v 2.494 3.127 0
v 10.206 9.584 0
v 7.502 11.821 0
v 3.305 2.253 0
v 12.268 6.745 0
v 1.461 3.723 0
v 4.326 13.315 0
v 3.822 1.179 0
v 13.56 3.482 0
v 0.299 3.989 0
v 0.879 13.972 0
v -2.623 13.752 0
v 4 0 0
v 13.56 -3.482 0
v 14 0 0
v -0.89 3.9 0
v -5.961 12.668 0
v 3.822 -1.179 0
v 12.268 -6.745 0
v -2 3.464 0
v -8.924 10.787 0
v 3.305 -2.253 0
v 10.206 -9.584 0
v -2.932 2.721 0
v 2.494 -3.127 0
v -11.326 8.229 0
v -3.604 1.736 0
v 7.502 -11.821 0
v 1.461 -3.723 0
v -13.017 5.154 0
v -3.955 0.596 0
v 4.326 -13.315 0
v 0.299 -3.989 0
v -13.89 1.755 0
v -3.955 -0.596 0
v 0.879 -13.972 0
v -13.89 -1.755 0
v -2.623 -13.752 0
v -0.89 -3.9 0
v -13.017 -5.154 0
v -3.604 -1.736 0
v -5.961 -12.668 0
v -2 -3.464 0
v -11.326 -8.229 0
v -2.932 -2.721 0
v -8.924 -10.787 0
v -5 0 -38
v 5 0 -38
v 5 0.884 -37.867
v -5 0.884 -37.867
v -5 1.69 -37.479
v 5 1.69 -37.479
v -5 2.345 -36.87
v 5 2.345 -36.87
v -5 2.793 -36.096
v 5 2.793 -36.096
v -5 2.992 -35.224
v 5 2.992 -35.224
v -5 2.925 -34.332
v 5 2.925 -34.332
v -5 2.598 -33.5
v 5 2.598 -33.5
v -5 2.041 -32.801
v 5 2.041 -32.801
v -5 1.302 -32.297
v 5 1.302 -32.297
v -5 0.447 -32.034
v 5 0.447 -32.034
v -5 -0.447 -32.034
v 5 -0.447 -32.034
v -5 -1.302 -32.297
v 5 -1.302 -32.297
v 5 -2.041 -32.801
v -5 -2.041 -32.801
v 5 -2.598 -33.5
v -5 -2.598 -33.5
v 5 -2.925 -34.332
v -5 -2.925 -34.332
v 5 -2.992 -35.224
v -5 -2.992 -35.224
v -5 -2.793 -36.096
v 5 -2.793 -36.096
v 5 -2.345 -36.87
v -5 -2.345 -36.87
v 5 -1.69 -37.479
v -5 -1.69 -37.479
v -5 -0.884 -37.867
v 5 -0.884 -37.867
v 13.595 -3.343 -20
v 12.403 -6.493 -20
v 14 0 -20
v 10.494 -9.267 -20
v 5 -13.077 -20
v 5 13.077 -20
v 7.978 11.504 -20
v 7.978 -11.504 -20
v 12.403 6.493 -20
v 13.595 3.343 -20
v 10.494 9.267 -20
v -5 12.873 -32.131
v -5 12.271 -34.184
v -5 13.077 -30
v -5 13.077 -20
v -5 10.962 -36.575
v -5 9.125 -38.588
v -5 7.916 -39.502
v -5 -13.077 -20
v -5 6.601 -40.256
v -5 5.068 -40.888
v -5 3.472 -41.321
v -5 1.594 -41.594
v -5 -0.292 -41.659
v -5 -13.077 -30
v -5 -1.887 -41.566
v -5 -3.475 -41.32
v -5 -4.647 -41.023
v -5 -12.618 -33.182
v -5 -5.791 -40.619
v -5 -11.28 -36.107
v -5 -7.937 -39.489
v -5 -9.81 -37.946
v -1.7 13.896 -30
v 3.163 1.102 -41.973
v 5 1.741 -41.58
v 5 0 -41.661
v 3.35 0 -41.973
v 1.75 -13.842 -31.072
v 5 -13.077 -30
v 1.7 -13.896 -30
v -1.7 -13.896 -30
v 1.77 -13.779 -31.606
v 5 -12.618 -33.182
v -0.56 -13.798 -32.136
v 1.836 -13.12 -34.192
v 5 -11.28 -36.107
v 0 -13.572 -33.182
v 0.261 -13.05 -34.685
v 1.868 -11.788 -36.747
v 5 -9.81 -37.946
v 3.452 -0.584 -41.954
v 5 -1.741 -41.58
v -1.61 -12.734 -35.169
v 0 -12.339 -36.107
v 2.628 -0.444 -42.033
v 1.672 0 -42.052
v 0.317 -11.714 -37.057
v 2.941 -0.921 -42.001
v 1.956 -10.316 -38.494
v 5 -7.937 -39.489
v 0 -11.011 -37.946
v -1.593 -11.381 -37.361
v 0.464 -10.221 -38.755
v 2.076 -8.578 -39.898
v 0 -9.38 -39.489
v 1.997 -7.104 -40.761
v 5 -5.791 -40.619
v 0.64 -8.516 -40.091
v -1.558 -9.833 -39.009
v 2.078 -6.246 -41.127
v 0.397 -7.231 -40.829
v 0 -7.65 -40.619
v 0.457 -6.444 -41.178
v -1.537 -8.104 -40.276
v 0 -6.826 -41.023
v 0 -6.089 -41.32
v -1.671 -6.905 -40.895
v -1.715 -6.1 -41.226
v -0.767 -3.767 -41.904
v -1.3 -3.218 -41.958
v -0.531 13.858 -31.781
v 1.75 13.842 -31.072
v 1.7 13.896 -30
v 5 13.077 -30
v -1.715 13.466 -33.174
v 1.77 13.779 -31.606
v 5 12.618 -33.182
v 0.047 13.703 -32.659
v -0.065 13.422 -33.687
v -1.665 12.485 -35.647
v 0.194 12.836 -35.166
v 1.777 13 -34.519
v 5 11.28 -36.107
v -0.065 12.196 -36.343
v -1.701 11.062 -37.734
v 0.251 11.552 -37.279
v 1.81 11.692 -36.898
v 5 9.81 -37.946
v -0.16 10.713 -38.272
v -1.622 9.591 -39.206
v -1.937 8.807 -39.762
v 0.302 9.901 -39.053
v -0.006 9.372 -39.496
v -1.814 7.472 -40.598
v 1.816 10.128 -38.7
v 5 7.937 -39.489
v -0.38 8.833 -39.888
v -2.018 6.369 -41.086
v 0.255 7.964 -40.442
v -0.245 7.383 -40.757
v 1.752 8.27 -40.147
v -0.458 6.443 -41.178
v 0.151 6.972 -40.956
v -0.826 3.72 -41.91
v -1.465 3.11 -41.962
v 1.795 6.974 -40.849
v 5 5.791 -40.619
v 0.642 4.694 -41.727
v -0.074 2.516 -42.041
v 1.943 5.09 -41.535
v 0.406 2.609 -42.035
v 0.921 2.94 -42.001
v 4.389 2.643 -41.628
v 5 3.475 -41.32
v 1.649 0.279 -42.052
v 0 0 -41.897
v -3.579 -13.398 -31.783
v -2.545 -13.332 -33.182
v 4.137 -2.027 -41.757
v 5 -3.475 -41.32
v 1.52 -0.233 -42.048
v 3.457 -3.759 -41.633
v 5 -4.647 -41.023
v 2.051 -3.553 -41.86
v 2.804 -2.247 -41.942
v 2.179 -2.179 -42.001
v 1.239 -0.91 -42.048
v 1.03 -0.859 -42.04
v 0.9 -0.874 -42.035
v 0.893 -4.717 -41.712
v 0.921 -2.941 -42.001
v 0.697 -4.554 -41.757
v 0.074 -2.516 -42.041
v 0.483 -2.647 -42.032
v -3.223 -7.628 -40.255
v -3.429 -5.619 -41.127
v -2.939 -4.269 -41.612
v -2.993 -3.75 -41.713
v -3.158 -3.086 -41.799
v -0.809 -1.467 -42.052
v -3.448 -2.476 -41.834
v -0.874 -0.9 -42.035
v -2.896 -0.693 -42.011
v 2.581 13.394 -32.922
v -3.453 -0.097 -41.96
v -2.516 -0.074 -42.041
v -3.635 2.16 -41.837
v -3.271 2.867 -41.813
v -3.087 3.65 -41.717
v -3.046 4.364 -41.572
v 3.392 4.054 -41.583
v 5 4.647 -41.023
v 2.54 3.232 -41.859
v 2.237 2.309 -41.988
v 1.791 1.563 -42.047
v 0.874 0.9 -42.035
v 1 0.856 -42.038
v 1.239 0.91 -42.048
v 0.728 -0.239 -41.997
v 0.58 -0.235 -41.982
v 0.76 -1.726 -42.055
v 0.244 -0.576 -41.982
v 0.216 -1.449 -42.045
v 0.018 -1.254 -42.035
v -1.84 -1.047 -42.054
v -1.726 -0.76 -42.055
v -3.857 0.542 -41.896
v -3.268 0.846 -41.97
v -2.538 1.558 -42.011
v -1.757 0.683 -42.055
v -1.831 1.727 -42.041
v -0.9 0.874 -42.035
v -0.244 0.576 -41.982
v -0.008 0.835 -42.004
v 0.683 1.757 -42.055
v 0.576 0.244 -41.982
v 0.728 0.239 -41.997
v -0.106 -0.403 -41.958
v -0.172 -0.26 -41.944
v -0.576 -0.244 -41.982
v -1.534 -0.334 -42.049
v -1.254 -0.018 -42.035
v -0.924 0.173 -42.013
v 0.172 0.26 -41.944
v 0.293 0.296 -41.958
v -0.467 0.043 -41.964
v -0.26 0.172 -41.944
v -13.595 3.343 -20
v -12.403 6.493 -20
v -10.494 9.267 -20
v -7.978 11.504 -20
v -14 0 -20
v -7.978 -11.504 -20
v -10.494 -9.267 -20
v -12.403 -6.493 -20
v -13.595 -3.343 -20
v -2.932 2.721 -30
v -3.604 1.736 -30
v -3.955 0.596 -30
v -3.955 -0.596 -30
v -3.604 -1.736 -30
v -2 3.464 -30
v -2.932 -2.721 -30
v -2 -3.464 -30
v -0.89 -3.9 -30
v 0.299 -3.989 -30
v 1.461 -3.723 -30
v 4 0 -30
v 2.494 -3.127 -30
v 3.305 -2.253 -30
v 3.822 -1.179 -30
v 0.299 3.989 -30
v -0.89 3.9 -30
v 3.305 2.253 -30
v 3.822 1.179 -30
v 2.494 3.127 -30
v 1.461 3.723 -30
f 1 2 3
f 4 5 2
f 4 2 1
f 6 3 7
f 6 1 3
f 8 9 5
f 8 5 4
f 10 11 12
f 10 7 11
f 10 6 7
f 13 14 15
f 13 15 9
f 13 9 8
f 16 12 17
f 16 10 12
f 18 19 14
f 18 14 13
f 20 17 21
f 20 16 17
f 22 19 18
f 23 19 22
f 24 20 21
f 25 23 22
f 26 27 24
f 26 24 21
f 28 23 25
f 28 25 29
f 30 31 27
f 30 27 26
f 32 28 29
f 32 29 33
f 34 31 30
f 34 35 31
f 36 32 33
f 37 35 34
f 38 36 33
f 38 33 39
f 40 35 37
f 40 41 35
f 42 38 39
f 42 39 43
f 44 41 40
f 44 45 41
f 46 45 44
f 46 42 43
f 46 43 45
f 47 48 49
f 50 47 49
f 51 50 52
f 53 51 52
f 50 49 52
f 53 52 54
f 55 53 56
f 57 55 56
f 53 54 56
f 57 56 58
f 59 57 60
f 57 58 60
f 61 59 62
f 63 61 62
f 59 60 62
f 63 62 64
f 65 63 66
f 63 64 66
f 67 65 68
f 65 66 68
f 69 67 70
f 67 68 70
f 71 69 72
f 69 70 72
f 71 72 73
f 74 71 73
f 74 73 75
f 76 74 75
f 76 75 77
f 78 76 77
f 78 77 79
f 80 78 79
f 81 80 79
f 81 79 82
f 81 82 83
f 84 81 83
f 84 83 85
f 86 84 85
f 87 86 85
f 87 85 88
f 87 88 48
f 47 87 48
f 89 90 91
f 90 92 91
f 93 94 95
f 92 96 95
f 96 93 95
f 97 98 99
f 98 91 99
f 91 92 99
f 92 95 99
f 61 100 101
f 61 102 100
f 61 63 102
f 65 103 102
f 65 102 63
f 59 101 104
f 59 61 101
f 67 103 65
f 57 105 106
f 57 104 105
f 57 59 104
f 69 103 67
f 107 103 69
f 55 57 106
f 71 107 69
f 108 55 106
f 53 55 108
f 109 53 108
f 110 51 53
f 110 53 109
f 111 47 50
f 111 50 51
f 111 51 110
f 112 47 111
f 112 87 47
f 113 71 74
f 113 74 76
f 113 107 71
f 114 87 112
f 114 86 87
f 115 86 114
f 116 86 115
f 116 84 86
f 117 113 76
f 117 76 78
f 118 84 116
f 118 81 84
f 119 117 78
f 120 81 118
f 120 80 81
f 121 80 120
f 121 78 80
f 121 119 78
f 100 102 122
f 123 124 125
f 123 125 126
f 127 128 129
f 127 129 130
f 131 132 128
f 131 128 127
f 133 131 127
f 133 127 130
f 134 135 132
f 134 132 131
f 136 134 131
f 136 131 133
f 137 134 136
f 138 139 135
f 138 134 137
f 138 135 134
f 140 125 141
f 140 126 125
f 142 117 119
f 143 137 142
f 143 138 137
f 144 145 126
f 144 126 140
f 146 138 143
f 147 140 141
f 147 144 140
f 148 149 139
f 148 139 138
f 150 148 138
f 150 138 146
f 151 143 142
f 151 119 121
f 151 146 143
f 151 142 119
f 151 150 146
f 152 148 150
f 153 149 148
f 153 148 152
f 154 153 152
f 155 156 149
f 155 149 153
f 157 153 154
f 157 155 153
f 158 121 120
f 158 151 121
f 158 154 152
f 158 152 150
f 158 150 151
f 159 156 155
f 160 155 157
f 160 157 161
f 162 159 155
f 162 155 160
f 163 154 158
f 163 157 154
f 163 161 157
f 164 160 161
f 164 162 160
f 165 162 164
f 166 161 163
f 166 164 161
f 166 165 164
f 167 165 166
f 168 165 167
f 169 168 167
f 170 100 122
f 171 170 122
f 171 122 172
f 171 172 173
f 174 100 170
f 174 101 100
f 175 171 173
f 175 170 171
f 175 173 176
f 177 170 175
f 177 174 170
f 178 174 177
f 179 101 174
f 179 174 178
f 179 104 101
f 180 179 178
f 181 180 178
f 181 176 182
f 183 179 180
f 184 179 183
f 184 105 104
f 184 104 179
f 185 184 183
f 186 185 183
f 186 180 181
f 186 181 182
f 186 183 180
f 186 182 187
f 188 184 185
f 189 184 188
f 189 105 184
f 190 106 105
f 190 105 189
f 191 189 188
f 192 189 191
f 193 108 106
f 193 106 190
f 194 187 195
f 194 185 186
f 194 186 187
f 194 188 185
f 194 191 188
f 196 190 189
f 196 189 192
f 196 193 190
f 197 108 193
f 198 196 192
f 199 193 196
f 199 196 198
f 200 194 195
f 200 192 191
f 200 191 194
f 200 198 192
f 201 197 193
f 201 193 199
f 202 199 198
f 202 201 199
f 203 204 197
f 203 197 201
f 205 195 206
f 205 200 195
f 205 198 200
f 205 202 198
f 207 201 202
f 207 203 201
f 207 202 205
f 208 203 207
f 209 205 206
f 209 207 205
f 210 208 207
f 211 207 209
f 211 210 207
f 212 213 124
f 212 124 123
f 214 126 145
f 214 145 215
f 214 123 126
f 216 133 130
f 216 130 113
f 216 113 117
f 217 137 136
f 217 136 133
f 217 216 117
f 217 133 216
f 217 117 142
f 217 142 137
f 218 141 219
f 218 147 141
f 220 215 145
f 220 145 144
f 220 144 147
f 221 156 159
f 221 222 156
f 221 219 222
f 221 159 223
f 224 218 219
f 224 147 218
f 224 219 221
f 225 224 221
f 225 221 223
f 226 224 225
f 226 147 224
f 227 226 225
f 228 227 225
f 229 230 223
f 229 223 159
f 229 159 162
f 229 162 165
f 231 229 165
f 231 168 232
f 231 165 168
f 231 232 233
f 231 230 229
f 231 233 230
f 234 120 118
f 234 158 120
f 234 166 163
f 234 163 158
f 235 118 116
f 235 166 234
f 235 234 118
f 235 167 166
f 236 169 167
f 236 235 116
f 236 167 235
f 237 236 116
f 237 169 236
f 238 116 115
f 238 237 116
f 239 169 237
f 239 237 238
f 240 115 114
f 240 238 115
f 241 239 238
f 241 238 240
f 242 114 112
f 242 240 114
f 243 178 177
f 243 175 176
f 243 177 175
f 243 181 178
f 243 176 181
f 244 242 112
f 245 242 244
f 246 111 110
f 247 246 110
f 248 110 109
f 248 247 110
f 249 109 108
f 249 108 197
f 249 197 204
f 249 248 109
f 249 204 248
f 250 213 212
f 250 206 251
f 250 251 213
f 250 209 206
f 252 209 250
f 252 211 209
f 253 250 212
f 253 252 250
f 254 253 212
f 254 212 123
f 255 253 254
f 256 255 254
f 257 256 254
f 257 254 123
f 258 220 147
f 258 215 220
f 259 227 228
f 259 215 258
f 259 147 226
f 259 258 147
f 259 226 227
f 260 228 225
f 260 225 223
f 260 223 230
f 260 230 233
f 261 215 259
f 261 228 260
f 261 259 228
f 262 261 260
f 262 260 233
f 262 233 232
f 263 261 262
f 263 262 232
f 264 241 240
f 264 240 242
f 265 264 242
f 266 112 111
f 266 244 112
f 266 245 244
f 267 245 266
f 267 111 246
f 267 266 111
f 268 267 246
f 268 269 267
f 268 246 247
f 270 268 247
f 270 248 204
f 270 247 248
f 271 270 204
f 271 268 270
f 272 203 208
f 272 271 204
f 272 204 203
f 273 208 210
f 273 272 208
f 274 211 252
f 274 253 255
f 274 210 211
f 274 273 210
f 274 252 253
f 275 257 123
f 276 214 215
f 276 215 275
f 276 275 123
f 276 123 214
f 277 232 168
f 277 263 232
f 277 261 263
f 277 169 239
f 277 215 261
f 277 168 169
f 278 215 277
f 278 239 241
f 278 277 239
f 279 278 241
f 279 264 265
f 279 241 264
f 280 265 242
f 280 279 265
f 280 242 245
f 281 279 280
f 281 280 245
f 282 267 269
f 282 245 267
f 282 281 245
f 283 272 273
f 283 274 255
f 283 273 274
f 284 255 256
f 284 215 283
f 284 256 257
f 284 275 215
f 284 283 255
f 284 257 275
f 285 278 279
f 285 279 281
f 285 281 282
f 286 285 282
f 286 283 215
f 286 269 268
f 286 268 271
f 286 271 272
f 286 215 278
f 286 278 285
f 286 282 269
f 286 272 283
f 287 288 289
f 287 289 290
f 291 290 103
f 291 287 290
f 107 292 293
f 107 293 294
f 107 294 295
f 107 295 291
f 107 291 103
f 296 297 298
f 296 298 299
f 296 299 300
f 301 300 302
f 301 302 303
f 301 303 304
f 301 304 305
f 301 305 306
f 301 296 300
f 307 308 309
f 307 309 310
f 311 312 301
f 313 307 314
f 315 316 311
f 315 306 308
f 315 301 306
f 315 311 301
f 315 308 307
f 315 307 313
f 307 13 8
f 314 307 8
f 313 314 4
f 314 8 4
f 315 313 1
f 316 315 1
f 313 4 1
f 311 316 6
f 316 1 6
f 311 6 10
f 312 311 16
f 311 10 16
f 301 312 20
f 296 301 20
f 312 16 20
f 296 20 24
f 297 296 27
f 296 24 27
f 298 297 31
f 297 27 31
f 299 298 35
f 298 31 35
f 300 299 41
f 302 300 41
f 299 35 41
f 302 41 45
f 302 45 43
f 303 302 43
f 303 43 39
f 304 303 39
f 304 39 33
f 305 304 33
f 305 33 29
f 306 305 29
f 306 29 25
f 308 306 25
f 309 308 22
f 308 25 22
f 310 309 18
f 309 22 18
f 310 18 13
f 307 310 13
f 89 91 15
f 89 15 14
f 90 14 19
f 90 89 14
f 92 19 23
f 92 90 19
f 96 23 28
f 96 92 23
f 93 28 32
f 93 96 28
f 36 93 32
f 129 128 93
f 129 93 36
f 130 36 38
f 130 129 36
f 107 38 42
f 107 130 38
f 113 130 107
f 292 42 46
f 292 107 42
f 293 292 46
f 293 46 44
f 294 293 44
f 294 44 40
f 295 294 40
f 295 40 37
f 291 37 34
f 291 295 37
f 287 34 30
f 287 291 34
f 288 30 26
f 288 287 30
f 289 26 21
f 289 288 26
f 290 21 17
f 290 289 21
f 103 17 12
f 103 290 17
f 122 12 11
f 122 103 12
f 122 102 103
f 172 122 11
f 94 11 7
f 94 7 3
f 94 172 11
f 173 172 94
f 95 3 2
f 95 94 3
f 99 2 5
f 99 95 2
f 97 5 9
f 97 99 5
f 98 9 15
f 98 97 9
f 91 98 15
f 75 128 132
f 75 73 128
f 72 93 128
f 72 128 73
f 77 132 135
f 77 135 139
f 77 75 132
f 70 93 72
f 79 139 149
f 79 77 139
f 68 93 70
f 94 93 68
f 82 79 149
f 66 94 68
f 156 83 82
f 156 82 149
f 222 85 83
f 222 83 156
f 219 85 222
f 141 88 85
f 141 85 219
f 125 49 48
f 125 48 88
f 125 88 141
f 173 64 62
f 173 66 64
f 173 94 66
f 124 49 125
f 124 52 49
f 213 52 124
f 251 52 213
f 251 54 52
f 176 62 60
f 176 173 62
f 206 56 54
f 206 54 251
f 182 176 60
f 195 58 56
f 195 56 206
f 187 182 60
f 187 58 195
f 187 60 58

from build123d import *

# Parameters (mm, degrees)
SKETCH2_R          = 4
CUT_EXTRUDE1_DEPTH = 30
SKETCH3_W          = 19.126095086
SKETCH3_H          = 32.253484506
SKETCH3_W_2        = 14.725893552
SKETCH3_H_2        = 25.816213186
CUT_EXTRUDE2_DEPTH = 15
SKETCH4_R          = 3
CUT_EXTRUDE3_DEPTH = 30


with BuildPart() as part:
    # Sketch1 → Revolve1 (revolve)
    with BuildSketch(Plane(origin=(0, 0, 0), x_dir=(0, 0, -1), z_dir=(1, 0, 0)), mode=Mode.PRIVATE) as revolve1_sk:
        with BuildLine():
            Line((0, 0), (0, 14))
            Line((0, 14), (30, 14))
            ThreePointArc((30, 14), (39.186081867, 9.751268794), (41.896907171, 0))
            Line((41.896907171, 0), (0, 0))
        make_face()
    revolve(revolve1_sk.sketch.rotate(Axis((0, 0, 8.753832377), (0, 0, -1)), 90), axis=Axis((0, 0, 8.753832377), (0, 0, -1)))

    # Sketch2 → Cut-Extrude1 (cut)
    with BuildSketch(Plane.XY):
        Circle(SKETCH2_R)
    extrude(amount=-CUT_EXTRUDE1_DEPTH, mode=Mode.SUBTRACT)

    # Sketch3 → Cut-Extrude2 (cut, symmetric)
    with BuildSketch(Plane(origin=(0, 0, 0), x_dir=(1, 0, 0), z_dir=(0, 1, 0))):
        with Locations((-14.563047543, 36.126742253)):
            Rectangle(SKETCH3_W, SKETCH3_H)
        with Locations((12.362946776, 32.908106593)):
            Rectangle(SKETCH3_W_2, SKETCH3_H_2)
    extrude(amount=CUT_EXTRUDE2_DEPTH, both=True, mode=Mode.SUBTRACT)

    # Sketch4 → Cut-Extrude3 (cut)
    with BuildSketch(Plane(origin=(5, 0, 0), x_dir=(0, 0, -1), z_dir=(1, 0, 0))):
        with Locations((35, 0)):
            Circle(SKETCH4_R)
    extrude(amount=-CUT_EXTRUDE3_DEPTH, mode=Mode.SUBTRACT)


solid = part.part
